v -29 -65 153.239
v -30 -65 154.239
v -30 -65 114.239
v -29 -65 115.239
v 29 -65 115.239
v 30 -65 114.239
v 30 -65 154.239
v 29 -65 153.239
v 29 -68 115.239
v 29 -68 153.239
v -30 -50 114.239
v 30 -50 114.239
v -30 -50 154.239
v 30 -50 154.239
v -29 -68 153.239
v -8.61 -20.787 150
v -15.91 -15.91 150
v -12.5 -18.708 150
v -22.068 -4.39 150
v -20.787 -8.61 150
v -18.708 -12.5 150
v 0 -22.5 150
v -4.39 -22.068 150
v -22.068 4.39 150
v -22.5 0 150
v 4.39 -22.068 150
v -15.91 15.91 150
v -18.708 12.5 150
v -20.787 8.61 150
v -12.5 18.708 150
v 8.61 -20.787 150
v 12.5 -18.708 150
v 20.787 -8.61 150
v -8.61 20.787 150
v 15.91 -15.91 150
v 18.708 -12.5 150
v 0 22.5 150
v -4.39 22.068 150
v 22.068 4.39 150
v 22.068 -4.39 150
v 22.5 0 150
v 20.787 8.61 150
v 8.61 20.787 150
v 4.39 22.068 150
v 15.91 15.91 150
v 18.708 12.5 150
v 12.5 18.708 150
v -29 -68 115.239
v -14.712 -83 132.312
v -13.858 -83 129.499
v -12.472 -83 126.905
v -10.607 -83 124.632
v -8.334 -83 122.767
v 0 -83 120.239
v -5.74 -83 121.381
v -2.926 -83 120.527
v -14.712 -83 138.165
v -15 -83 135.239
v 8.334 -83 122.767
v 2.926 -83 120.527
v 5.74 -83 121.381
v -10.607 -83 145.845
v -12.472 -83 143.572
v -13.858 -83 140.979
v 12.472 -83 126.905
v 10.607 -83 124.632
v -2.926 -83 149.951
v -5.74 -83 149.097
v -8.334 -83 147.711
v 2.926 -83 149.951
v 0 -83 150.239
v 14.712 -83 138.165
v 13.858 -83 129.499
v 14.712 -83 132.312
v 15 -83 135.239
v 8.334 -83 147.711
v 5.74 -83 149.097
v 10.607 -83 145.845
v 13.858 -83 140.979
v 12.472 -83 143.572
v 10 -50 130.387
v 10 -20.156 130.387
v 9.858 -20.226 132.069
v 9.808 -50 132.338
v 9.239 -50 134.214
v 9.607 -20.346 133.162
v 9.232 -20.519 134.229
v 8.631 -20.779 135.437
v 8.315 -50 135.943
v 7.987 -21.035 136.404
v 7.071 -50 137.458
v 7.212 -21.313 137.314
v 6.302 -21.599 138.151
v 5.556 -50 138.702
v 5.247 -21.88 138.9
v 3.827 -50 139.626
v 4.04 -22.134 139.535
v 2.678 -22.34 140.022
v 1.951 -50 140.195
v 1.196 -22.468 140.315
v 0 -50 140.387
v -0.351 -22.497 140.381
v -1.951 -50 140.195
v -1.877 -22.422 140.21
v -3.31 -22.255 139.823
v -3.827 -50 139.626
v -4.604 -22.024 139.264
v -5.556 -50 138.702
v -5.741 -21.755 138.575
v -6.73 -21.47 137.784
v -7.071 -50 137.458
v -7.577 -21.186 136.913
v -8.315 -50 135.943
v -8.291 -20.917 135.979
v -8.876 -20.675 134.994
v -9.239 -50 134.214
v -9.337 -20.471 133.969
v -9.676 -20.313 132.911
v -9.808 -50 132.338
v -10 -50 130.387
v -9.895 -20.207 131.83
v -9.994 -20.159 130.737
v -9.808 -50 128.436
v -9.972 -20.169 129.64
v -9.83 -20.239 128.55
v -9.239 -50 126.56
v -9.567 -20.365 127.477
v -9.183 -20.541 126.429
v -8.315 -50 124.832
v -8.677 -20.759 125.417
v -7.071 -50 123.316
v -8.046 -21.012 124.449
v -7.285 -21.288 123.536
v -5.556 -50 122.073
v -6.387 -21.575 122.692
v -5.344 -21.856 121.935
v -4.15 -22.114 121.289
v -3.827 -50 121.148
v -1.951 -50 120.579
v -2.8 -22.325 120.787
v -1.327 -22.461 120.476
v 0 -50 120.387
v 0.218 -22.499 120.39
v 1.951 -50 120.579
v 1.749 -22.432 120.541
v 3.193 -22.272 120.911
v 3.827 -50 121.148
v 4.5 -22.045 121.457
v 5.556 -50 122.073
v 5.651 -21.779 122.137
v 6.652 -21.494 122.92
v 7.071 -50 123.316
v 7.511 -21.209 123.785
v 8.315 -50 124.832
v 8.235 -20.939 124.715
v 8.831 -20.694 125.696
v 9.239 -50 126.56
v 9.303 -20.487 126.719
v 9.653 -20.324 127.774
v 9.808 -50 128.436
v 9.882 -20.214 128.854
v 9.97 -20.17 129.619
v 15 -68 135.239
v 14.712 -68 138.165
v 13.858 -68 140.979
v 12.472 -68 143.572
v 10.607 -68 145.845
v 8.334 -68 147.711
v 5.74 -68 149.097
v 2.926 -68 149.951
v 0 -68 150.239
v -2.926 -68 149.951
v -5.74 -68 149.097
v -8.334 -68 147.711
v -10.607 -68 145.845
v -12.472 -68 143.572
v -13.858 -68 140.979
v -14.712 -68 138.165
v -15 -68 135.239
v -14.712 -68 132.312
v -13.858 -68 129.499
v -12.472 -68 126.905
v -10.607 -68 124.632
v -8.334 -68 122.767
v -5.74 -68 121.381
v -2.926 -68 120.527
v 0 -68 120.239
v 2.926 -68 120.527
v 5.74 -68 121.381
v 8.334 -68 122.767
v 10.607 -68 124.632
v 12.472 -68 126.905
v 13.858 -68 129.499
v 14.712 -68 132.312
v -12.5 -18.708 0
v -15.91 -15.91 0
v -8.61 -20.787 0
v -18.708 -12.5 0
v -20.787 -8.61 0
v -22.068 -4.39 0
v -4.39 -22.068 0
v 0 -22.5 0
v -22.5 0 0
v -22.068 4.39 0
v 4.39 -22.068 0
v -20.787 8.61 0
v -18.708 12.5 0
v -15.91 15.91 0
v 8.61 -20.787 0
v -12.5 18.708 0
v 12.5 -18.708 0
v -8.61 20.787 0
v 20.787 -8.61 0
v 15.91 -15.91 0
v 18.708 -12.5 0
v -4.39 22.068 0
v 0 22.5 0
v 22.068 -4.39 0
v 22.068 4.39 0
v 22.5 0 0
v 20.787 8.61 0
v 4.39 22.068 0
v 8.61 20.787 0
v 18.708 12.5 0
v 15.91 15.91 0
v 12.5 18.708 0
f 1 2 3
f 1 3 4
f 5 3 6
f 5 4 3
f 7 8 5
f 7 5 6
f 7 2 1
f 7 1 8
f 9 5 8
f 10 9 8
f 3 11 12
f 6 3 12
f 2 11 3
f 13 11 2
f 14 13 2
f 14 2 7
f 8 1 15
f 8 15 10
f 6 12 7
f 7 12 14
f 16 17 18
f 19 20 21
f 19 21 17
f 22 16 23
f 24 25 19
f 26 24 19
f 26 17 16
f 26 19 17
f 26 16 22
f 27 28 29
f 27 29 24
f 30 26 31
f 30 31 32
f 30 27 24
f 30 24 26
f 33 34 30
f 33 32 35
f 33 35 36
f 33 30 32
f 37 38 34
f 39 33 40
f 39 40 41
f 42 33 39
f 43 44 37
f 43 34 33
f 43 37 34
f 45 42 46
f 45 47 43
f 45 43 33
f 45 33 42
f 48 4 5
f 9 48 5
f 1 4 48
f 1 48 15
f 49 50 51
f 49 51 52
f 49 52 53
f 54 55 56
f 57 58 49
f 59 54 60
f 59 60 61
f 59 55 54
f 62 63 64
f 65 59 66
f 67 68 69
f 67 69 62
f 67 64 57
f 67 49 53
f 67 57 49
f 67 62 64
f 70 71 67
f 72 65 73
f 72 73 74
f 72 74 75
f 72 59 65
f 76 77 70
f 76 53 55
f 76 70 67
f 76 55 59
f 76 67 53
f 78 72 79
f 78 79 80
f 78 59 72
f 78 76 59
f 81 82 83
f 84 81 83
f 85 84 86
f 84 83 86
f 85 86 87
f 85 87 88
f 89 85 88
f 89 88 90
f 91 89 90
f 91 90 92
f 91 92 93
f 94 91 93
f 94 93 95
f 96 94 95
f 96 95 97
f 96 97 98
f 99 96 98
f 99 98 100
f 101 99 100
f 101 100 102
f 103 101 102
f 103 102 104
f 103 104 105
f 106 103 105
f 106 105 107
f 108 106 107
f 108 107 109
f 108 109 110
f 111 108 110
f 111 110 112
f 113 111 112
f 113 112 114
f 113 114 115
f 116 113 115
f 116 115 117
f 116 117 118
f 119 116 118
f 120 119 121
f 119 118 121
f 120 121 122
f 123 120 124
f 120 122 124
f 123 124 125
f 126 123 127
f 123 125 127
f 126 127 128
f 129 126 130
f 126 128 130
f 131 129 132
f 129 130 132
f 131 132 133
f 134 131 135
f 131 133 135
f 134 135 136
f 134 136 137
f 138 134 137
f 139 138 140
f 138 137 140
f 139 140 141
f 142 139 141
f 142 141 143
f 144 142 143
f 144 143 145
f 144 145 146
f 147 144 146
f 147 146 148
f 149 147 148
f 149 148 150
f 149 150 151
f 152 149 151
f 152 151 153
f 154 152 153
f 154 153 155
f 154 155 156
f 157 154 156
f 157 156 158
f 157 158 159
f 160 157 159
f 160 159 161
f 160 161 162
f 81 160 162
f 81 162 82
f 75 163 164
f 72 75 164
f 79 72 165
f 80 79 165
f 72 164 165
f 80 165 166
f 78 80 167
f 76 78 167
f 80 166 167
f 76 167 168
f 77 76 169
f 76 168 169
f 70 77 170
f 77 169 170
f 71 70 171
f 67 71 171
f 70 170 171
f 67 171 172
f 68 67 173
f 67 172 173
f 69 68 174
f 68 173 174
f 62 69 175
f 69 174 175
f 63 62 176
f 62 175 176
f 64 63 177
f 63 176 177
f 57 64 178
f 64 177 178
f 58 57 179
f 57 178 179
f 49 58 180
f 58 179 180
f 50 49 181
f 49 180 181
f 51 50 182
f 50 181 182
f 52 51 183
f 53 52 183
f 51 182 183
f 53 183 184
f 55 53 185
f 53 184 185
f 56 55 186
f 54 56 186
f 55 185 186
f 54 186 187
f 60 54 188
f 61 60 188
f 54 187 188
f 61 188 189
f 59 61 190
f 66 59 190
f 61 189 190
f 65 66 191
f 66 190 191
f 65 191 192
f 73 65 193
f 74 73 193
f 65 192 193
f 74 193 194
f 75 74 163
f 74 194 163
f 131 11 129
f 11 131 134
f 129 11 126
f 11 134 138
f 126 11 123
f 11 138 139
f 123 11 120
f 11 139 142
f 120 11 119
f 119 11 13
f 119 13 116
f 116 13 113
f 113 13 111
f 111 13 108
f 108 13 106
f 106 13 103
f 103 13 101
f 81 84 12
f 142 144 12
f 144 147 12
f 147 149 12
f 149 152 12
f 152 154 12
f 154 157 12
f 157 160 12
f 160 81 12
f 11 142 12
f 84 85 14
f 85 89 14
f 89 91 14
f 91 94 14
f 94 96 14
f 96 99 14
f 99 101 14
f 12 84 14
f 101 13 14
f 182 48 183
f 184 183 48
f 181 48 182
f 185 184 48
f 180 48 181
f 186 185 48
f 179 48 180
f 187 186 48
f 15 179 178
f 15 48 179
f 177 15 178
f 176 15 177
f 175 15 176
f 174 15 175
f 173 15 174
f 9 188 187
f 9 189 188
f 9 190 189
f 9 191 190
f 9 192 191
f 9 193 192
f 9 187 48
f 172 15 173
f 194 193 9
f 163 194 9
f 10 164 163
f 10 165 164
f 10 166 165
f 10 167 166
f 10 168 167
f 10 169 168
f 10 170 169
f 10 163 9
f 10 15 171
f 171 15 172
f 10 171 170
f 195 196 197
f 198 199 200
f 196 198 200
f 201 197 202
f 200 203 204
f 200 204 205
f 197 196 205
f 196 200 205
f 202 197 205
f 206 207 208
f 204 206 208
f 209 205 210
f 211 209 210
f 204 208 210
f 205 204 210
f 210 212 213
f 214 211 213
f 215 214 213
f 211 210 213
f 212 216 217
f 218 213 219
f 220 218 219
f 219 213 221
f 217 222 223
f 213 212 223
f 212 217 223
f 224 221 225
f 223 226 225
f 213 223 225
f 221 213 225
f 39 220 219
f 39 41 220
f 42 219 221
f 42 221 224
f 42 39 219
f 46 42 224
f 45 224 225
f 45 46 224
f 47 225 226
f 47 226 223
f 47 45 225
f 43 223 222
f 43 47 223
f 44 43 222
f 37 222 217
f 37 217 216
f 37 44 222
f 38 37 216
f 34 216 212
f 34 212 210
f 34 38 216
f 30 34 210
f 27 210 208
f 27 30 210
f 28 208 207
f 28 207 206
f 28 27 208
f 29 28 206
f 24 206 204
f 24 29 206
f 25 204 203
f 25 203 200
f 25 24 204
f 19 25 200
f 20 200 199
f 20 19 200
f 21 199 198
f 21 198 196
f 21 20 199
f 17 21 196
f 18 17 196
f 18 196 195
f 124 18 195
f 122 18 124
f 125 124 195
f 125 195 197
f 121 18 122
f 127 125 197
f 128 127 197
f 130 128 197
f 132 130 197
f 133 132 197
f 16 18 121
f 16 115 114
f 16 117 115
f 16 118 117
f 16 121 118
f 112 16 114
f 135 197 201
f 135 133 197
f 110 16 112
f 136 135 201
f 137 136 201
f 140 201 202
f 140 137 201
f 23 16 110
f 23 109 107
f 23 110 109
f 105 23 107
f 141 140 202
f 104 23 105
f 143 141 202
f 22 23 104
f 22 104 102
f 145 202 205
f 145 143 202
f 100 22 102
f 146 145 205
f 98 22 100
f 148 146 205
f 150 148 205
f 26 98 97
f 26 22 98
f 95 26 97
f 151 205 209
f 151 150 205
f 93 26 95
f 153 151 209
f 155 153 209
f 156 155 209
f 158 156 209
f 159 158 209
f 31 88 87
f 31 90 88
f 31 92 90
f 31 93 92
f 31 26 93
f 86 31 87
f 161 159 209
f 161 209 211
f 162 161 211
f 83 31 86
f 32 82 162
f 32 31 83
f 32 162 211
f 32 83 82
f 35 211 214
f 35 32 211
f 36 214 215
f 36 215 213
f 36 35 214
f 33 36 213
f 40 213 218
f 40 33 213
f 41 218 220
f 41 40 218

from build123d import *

# Parameters (mm, degrees)
F2_R      = 10
F3_DEPTH  = 50
F5_W      = 60
F5_H      = 40
F6_DEPTH  = 15
F0_R      = 22.5
F8_W      = 58
F8_H      = 38
F9_DEPTH  = 3
F10_R     = 15
F11_DEPTH = 15


with BuildPart() as f3:
    # F2 (on Front) → F3 (new body)
    with BuildSketch(Plane.XZ):
        with Locations((0, 130.387224)):
            Circle(F2_R)
    extrude(amount=F3_DEPTH)

    # F5 (on offset) → F6 (join)
    with BuildSketch(Plane.XZ.offset(50)):
        with Locations((0, 134.238796)):
            Rectangle(F5_W, F5_H)
    extrude(amount=F6_DEPTH)

    # F7: sweep along a path in F1
    with BuildLine(Plane.XZ) as f7_path:
        Line((0, 0), (0, 150))
    # F0 (on Top) → F7 (sweep)
    with BuildSketch(Plane.XY):
        Circle(F0_R)
    sweep(path=f7_path.line)

    # F8 (on face) → F9 (join)
    with BuildSketch(Plane.XZ.offset(65)):
        with Locations((0, 134.238796)):
            Rectangle(F8_W, F8_H)
    extrude(amount=F9_DEPTH)

    # F10 (on face) → F11 (join)
    with BuildSketch(Plane.XZ.offset(68)):
        with Locations((0, 135.238796)):
            Circle(F10_R)
    extrude(amount=F11_DEPTH)


solid = f3.part
